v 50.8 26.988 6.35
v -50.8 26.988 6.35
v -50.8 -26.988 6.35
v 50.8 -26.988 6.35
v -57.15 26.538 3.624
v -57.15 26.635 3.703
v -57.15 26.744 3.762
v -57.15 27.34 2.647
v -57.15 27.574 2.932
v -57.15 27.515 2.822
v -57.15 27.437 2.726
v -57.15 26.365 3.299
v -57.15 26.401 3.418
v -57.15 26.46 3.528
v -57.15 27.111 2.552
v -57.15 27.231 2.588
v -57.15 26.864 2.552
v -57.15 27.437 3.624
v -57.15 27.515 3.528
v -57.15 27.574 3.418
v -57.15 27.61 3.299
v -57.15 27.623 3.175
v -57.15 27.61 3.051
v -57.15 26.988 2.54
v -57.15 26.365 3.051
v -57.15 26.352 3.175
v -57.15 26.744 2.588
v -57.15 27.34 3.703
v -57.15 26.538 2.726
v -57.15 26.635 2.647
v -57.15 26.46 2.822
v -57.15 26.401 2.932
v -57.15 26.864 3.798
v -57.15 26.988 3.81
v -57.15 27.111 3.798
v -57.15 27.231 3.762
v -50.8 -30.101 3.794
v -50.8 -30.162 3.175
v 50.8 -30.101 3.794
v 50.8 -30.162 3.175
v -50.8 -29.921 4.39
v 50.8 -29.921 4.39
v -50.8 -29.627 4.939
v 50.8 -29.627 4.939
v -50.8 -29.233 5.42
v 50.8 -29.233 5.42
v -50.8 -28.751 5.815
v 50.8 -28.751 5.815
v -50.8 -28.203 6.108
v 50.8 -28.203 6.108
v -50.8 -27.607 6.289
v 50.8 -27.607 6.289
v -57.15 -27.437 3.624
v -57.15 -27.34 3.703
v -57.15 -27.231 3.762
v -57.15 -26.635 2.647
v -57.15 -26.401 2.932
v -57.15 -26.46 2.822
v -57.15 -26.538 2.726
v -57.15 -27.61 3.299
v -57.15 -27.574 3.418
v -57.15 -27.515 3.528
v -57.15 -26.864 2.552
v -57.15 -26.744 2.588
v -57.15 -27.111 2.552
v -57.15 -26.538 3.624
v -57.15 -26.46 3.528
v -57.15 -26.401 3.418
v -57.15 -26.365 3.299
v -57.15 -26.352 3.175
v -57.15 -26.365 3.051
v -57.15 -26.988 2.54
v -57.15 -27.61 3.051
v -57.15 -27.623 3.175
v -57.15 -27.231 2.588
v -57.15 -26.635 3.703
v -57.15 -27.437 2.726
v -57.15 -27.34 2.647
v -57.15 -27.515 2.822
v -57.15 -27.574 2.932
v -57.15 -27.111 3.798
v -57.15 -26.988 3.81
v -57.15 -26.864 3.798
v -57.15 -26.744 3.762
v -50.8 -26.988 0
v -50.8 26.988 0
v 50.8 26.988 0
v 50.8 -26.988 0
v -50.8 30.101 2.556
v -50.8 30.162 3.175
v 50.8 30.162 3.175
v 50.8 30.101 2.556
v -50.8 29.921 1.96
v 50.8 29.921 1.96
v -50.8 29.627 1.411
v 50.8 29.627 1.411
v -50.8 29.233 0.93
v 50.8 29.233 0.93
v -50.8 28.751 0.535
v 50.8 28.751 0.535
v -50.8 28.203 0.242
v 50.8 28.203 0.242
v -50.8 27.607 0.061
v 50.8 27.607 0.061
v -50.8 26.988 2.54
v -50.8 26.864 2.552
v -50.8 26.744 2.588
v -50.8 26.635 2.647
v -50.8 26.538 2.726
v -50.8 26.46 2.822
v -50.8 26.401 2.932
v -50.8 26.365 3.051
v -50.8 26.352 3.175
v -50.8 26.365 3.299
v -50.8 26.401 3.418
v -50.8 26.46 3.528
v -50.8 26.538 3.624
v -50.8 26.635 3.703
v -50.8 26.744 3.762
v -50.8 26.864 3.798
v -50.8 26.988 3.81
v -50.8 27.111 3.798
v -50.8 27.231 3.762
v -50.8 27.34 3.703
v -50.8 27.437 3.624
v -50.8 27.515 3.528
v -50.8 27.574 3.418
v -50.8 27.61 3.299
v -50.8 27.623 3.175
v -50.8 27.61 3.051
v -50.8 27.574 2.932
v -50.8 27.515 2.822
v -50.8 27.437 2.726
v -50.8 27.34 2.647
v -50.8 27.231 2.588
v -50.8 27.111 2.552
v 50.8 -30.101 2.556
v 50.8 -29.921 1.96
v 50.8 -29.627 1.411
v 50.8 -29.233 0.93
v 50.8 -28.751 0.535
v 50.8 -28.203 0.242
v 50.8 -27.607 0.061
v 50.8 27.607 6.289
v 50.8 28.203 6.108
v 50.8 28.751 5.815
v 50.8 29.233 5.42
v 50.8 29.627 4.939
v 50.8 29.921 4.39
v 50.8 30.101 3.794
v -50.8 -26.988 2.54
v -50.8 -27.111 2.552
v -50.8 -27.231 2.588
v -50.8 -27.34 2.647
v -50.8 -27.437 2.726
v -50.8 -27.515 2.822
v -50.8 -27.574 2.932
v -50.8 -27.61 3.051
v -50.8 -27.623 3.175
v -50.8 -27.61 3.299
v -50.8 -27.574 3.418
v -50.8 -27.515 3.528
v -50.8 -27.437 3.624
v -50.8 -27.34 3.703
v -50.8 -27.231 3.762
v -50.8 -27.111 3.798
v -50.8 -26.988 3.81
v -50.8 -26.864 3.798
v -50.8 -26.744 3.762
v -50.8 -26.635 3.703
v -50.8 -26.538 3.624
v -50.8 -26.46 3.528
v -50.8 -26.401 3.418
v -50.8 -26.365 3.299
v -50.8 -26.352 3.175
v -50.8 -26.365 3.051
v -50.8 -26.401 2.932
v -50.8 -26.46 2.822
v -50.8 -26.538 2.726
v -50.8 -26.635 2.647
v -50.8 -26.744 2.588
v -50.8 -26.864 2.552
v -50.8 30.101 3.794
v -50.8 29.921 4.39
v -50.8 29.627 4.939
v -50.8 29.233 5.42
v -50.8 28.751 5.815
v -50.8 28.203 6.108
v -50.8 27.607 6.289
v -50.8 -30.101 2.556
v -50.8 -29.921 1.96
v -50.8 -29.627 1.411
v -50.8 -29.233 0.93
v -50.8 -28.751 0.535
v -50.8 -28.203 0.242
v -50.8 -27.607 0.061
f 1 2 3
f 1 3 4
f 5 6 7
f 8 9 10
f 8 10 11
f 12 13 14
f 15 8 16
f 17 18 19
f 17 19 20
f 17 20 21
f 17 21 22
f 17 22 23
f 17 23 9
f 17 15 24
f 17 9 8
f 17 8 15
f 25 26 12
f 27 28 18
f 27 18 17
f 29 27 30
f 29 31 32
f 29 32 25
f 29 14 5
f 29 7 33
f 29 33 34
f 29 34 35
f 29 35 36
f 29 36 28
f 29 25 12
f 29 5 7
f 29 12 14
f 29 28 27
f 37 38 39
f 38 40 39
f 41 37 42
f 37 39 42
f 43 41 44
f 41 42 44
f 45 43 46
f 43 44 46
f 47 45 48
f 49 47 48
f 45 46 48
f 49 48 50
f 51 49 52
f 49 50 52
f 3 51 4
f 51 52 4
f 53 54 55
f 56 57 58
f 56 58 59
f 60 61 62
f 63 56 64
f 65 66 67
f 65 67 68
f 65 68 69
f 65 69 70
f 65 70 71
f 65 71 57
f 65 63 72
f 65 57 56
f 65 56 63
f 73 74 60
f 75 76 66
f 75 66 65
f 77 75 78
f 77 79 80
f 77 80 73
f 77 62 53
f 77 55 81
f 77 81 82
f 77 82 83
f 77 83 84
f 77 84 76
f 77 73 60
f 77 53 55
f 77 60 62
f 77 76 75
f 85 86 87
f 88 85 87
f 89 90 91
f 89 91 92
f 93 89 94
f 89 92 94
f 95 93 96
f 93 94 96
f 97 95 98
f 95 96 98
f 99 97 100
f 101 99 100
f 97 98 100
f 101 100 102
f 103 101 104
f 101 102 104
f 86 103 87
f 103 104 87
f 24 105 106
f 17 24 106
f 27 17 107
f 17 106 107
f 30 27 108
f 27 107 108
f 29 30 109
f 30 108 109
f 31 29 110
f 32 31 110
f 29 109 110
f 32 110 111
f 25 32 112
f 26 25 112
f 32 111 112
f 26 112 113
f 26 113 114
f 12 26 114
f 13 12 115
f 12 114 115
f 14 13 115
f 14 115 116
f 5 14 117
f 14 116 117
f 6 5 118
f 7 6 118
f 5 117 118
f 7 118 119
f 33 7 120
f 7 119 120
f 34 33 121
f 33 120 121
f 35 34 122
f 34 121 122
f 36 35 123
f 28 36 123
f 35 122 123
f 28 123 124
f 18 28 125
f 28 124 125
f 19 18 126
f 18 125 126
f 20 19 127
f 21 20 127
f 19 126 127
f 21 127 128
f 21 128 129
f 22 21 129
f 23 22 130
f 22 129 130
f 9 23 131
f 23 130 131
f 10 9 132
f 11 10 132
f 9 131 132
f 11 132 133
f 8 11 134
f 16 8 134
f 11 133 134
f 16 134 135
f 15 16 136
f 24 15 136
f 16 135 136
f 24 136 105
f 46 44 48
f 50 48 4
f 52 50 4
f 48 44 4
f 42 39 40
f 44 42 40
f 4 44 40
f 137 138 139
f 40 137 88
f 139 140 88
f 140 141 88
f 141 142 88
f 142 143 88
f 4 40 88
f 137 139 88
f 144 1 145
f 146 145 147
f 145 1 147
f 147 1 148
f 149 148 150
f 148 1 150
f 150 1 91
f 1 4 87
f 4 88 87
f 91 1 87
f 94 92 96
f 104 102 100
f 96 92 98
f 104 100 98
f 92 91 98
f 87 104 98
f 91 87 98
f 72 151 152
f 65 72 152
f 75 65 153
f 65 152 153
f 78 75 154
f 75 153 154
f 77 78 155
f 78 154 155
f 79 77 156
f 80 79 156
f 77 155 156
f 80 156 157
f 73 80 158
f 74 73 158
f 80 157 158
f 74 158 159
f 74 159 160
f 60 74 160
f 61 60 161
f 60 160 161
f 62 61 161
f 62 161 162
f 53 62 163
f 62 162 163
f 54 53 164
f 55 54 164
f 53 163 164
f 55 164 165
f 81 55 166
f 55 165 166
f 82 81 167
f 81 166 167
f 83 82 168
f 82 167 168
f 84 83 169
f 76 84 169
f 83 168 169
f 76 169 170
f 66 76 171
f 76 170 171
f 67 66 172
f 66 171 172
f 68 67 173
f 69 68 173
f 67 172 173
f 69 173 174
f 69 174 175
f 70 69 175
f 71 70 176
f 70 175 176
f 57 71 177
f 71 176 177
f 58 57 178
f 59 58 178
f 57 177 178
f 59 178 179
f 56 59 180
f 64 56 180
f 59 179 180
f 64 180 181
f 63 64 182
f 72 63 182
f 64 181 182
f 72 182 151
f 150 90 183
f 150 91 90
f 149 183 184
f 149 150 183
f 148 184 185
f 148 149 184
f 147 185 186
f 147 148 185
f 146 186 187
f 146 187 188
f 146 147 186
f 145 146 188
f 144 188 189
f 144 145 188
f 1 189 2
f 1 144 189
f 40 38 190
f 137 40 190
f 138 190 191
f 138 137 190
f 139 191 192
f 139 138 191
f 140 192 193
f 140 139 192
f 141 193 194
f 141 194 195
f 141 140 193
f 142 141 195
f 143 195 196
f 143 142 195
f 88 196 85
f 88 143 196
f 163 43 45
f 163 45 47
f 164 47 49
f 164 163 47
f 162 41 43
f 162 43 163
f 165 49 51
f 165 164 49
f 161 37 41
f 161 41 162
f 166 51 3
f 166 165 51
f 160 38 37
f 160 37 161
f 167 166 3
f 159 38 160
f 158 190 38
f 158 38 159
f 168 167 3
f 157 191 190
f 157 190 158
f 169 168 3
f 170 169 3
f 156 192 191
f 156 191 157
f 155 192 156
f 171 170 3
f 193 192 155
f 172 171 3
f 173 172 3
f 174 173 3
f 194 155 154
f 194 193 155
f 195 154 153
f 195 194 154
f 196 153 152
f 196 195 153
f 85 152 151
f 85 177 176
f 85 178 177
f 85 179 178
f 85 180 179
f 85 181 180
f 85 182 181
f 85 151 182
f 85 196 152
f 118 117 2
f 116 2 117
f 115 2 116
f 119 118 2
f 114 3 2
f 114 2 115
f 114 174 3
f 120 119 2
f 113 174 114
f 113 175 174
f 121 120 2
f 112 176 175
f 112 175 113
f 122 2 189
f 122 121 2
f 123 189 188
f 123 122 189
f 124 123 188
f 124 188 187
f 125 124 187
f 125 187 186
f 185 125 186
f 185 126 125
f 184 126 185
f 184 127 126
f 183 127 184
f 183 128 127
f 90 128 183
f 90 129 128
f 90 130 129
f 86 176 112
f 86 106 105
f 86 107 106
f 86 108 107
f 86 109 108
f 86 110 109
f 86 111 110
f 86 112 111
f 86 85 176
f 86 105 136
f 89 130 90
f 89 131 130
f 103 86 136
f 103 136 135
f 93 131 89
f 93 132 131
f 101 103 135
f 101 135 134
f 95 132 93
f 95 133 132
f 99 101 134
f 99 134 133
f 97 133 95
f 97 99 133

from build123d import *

# Parameters (mm, degrees)
SKETCH1_W           = 101.6
SKETCH1_H           = 60.325
BOSS_EXTRUDE1_DEPTH = 6.35
FILLET1_R           = 3.175
SKETCH2_R           = 0.635
BOSS_EXTRUDE2_DEPTH = 6.35


with BuildPart() as part:
    # Sketch1 → Boss-Extrude1 (new body)
    with BuildSketch(Plane.XY):
        Rectangle(SKETCH1_W, SKETCH1_H)
    extrude(amount=BOSS_EXTRUDE1_DEPTH)

    # Fillet1
    fillet1_edges = [part.edges().sort_by_distance(p)[0] for p in [
        (0, 30.1625, 6.35),
        (0, 30.1625, 0),
        (0, -30.1625, 6.35),
        (0, -30.1625, 0),
    ]]
    fillet(fillet1_edges, radius=FILLET1_R - 0.0001)  # a hair under: the kernel refuses the full size

    # Sketch2 → Boss-Extrude2 (add)
    with BuildSketch(Plane.ZY.offset(50.8)):
        with Locations(Location((3.175, 26.9875, 0), (0, 0, 180))):
            Circle(SKETCH2_R)
        with Locations(Location((3.175, -26.9875, 0), (0, 0, 180))):
            Circle(SKETCH2_R)
    extrude(amount=BOSS_EXTRUDE2_DEPTH)


solid = part.part
